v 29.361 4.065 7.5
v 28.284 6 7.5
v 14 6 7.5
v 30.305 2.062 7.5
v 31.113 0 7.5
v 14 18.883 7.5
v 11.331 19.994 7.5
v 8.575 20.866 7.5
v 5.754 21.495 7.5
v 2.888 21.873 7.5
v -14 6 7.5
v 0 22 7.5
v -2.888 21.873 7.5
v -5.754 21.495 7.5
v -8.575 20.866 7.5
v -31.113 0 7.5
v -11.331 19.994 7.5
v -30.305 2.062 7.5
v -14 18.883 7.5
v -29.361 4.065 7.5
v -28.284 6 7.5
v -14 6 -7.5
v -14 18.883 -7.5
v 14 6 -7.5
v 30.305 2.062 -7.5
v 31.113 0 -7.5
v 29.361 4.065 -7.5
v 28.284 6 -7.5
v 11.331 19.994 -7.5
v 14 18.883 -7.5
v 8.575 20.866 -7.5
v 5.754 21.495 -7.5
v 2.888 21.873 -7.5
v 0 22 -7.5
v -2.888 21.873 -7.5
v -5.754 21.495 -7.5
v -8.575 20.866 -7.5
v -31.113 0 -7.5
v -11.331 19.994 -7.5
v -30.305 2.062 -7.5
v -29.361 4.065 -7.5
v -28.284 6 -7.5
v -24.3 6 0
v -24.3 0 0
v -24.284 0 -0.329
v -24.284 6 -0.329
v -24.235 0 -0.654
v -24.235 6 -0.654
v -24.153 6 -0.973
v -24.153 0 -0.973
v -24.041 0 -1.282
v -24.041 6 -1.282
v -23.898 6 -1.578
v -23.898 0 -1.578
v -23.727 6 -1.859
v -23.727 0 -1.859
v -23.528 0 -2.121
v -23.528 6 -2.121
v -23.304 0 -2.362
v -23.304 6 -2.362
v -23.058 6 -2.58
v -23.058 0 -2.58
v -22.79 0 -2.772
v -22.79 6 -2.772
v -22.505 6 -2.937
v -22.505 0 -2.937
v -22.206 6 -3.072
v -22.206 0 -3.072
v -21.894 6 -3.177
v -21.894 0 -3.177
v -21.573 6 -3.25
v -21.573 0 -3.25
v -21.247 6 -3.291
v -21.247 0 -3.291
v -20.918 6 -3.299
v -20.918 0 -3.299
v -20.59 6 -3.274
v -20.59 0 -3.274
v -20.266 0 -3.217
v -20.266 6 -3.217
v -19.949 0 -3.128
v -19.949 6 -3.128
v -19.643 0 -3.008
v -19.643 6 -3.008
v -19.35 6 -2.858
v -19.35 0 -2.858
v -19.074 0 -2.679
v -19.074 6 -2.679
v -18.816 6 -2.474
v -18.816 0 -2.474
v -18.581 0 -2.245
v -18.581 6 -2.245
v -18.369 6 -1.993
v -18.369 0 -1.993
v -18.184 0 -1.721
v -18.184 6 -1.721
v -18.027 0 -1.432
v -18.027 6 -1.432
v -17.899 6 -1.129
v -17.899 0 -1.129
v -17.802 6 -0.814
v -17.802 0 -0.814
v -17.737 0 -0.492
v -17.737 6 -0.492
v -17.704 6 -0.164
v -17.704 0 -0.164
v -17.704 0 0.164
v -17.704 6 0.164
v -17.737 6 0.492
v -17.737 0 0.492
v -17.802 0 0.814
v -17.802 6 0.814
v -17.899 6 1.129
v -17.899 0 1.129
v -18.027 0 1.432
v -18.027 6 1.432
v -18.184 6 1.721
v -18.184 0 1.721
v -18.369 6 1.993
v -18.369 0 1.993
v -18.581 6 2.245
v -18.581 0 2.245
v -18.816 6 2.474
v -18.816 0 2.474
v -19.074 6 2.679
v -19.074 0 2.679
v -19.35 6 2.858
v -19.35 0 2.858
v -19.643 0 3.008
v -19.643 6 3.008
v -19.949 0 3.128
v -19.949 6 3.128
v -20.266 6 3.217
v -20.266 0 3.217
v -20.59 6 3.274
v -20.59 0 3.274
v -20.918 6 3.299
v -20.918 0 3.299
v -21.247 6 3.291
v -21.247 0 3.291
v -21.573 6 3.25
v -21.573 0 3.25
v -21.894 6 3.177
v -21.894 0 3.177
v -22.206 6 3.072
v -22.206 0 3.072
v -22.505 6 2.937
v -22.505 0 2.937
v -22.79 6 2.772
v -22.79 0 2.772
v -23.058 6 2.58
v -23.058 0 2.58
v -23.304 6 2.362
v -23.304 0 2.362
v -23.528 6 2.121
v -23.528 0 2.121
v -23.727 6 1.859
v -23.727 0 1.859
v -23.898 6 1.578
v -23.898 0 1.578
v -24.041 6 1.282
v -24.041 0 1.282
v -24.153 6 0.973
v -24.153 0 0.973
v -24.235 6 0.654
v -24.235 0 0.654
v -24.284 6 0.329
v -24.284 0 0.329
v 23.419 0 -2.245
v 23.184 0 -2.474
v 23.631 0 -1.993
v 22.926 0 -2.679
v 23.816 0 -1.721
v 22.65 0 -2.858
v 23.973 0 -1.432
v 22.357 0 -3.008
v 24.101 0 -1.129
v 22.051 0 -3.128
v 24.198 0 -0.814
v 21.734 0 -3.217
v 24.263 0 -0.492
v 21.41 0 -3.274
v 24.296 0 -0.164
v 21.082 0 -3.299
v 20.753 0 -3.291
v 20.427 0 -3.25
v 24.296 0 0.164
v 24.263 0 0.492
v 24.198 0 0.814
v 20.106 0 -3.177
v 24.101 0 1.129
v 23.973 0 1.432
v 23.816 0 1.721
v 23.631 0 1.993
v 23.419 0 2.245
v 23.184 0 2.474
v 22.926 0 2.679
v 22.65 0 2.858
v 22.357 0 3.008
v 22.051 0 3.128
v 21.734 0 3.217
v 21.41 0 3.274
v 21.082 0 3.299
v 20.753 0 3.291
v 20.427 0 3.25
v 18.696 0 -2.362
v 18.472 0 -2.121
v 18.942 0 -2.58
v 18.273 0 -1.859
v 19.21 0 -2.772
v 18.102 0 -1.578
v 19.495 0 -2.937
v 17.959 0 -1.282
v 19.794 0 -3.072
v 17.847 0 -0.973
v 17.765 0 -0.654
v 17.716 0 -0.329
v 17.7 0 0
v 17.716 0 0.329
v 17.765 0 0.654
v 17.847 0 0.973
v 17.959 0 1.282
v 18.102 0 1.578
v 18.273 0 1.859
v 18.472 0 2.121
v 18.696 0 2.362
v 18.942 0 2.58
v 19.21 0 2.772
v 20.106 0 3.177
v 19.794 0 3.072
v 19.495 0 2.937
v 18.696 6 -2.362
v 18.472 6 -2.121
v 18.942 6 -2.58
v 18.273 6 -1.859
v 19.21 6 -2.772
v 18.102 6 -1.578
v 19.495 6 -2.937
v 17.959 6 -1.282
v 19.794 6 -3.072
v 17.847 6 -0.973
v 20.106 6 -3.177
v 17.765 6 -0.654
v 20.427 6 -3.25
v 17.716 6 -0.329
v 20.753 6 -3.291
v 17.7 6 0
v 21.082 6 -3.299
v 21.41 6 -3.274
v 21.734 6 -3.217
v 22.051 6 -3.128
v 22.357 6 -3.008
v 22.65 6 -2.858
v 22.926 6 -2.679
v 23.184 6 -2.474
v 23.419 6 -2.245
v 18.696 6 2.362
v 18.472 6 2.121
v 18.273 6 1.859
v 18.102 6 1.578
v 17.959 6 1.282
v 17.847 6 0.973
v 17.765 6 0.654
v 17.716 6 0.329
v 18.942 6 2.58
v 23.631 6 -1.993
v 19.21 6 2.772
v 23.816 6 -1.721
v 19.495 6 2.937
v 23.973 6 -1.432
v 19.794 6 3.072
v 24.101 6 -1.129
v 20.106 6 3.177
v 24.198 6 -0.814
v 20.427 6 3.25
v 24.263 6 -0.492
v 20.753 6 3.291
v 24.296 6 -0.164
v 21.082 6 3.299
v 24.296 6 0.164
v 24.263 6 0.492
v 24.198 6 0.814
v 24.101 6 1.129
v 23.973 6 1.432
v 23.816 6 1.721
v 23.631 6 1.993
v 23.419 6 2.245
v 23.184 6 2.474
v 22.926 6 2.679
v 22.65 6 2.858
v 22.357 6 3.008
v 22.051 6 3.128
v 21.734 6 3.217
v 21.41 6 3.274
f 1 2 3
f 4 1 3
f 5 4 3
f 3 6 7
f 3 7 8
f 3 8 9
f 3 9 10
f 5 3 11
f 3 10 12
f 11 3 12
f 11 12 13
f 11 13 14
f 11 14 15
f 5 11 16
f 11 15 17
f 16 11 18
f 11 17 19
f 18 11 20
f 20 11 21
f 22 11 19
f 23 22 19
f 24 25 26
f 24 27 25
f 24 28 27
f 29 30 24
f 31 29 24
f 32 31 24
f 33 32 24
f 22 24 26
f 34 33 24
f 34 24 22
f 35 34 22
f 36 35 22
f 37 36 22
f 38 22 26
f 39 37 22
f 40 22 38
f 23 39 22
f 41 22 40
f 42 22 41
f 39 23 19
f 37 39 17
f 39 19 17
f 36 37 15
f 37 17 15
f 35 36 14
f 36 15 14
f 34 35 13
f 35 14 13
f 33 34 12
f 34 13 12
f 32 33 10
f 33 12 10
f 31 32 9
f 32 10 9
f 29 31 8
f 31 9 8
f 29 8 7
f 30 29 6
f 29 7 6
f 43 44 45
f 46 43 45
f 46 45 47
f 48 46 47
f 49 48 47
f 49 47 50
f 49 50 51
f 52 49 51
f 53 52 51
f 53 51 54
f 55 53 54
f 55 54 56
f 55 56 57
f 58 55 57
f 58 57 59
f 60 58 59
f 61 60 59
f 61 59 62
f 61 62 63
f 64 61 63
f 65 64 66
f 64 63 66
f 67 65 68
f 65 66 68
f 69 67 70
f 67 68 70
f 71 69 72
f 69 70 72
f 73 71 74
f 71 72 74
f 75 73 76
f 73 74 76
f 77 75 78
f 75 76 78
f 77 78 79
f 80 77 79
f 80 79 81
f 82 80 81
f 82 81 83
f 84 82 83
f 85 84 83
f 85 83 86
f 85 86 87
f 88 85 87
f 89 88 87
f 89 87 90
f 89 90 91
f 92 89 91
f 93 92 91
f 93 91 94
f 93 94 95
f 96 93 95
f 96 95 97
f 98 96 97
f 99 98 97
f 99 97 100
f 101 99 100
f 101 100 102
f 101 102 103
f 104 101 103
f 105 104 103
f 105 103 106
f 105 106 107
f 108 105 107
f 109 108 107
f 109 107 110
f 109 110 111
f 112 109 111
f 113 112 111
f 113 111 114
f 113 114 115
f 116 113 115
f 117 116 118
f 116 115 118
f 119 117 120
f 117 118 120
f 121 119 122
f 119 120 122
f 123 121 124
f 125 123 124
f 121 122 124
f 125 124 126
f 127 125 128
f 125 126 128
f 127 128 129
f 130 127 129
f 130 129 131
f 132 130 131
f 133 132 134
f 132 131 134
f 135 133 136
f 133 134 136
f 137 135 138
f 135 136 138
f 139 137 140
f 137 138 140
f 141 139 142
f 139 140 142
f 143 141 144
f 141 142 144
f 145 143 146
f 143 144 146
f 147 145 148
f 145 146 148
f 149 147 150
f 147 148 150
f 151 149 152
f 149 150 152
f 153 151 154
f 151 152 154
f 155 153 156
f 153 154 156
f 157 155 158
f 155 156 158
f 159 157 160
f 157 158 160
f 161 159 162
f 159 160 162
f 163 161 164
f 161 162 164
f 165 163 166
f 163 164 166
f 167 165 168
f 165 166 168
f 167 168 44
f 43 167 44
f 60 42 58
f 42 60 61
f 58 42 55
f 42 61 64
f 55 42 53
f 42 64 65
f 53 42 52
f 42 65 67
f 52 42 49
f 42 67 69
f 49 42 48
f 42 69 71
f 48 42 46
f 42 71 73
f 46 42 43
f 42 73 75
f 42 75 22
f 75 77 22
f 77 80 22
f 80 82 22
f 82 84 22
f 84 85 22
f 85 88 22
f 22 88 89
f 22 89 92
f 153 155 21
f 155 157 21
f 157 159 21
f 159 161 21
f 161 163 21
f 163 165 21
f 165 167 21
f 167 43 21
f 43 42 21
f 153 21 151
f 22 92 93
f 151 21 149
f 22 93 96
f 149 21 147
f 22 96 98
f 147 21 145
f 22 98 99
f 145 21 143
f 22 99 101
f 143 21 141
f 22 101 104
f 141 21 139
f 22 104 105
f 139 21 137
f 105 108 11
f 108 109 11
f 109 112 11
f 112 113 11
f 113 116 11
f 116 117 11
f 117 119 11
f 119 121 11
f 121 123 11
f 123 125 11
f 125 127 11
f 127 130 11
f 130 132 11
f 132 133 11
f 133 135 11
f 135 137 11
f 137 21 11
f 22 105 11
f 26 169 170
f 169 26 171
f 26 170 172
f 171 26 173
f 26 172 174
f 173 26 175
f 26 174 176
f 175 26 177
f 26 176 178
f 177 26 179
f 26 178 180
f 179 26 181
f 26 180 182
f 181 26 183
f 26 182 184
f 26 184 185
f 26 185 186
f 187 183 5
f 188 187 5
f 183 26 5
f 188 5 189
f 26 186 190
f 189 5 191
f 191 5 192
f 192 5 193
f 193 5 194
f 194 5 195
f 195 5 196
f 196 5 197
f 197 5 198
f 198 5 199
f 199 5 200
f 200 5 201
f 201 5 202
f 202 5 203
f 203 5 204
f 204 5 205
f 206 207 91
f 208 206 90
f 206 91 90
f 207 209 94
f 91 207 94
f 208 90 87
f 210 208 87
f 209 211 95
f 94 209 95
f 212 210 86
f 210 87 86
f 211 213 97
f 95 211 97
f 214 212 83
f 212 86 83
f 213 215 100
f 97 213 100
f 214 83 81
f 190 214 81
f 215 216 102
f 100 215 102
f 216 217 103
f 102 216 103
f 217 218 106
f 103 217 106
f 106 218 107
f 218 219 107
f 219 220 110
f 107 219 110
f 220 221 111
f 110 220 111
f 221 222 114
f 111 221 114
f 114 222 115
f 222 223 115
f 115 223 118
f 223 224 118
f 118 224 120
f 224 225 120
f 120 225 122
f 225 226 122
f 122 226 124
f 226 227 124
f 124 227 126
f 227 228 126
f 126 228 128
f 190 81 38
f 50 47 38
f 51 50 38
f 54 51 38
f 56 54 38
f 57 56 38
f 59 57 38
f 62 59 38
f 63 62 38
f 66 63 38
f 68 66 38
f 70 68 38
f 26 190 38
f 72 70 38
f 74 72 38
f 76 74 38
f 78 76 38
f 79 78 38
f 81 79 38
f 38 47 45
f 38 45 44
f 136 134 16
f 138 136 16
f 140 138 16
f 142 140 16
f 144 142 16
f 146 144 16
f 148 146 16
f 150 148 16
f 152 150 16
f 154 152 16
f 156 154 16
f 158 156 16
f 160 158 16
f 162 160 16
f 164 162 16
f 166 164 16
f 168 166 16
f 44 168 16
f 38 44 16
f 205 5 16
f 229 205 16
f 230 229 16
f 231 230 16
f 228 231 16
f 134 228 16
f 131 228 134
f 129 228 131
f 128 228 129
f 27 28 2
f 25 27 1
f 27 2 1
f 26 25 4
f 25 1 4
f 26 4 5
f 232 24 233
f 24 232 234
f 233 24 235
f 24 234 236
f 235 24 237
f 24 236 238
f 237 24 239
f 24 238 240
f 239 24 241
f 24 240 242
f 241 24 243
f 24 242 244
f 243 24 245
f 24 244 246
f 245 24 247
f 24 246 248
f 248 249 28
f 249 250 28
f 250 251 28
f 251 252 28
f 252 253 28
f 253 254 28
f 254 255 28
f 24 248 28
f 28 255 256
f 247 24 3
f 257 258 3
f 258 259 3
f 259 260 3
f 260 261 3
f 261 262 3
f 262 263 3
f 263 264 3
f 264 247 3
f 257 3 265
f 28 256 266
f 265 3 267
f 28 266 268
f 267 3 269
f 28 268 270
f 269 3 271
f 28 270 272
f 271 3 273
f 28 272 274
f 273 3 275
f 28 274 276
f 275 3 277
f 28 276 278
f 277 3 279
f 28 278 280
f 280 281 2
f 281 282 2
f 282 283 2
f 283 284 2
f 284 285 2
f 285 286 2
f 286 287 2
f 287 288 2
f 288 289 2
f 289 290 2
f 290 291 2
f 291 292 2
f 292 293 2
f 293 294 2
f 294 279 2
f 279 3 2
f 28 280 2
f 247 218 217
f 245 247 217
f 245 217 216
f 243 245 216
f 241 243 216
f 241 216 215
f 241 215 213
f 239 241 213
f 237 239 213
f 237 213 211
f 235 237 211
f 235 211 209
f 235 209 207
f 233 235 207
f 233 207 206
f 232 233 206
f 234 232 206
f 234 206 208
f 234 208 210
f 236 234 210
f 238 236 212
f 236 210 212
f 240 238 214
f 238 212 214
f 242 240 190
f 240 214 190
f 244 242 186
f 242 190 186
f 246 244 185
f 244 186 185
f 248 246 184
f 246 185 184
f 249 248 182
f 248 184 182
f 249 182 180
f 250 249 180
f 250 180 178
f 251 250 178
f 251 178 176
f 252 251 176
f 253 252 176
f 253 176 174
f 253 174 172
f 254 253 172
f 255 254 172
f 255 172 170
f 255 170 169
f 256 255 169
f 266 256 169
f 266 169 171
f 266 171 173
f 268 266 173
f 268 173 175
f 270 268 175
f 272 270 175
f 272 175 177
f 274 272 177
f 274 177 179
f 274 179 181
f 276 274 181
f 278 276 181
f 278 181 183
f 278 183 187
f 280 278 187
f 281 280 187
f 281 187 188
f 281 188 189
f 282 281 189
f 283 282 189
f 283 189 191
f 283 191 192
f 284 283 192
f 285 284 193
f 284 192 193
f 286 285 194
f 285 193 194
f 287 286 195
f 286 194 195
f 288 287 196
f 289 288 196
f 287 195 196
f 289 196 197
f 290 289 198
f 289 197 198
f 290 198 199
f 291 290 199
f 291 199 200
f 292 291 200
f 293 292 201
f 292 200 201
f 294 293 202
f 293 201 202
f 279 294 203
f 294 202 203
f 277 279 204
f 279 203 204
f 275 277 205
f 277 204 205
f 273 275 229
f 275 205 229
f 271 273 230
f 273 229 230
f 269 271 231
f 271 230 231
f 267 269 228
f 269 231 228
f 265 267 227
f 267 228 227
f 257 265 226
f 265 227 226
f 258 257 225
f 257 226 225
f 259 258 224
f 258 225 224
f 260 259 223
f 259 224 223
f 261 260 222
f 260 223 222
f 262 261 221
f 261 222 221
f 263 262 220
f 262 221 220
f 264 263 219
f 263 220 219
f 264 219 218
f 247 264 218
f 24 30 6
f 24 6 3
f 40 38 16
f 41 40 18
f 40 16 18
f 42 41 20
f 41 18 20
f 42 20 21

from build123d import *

# Parameters (mm, degrees)
EXTRUDE_1_DEPTH          = 7.5
CUT_EXTRUDE_3_DEPTH      = 8.5
CUT_EXTRUDE_3_DEPTH_BACK = 8.5
HOLE_WIZARD_M4_1_D       = 6.6


with BuildPart() as part:
    # 스케치1 → 보스-돌출1 (new body, symmetric)
    with BuildSketch(Plane.XY):
        Polygon((-14, 22), (14, 22), (14, 6), (40, 6), (40, 0), (-40, 0), (-40, 6), (-14, 6), align=None)
    extrude(amount=EXTRUDE_1_DEPTH, both=True)

    # 스케치2 → 컷-돌출3 (cut, two sides)
    with BuildSketch(Plane.XY) as cut_extrude_3_sk:
        with BuildLine():
            Line((-40, 0), (-31.112698372, 0))
            ThreePointArc((-31.112698372, 0), (0, 22), (31.112698372, 0))
            Line((31.112698372, 0), (40, 0))
            Line((40, 0), (40, 32))
            Line((40, 32), (-40, 32))
            Line((-40, 32), (-40, 0))
        make_face()
    extrude(amount=CUT_EXTRUDE_3_DEPTH, mode=Mode.SUBTRACT)
    extrude(cut_extrude_3_sk.sketch, amount=-CUT_EXTRUDE_3_DEPTH_BACK, mode=Mode.SUBTRACT)

    # M4 여유 구멍1 (through all)
    with Locations(Plane(origin=(0, 6, 0), x_dir=(1, 0, 0), z_dir=(0, 1, 0))):
        with Locations((-21, 0), (21, 0)):
            Hole(HOLE_WIZARD_M4_1_D / 2)


solid = part.part
